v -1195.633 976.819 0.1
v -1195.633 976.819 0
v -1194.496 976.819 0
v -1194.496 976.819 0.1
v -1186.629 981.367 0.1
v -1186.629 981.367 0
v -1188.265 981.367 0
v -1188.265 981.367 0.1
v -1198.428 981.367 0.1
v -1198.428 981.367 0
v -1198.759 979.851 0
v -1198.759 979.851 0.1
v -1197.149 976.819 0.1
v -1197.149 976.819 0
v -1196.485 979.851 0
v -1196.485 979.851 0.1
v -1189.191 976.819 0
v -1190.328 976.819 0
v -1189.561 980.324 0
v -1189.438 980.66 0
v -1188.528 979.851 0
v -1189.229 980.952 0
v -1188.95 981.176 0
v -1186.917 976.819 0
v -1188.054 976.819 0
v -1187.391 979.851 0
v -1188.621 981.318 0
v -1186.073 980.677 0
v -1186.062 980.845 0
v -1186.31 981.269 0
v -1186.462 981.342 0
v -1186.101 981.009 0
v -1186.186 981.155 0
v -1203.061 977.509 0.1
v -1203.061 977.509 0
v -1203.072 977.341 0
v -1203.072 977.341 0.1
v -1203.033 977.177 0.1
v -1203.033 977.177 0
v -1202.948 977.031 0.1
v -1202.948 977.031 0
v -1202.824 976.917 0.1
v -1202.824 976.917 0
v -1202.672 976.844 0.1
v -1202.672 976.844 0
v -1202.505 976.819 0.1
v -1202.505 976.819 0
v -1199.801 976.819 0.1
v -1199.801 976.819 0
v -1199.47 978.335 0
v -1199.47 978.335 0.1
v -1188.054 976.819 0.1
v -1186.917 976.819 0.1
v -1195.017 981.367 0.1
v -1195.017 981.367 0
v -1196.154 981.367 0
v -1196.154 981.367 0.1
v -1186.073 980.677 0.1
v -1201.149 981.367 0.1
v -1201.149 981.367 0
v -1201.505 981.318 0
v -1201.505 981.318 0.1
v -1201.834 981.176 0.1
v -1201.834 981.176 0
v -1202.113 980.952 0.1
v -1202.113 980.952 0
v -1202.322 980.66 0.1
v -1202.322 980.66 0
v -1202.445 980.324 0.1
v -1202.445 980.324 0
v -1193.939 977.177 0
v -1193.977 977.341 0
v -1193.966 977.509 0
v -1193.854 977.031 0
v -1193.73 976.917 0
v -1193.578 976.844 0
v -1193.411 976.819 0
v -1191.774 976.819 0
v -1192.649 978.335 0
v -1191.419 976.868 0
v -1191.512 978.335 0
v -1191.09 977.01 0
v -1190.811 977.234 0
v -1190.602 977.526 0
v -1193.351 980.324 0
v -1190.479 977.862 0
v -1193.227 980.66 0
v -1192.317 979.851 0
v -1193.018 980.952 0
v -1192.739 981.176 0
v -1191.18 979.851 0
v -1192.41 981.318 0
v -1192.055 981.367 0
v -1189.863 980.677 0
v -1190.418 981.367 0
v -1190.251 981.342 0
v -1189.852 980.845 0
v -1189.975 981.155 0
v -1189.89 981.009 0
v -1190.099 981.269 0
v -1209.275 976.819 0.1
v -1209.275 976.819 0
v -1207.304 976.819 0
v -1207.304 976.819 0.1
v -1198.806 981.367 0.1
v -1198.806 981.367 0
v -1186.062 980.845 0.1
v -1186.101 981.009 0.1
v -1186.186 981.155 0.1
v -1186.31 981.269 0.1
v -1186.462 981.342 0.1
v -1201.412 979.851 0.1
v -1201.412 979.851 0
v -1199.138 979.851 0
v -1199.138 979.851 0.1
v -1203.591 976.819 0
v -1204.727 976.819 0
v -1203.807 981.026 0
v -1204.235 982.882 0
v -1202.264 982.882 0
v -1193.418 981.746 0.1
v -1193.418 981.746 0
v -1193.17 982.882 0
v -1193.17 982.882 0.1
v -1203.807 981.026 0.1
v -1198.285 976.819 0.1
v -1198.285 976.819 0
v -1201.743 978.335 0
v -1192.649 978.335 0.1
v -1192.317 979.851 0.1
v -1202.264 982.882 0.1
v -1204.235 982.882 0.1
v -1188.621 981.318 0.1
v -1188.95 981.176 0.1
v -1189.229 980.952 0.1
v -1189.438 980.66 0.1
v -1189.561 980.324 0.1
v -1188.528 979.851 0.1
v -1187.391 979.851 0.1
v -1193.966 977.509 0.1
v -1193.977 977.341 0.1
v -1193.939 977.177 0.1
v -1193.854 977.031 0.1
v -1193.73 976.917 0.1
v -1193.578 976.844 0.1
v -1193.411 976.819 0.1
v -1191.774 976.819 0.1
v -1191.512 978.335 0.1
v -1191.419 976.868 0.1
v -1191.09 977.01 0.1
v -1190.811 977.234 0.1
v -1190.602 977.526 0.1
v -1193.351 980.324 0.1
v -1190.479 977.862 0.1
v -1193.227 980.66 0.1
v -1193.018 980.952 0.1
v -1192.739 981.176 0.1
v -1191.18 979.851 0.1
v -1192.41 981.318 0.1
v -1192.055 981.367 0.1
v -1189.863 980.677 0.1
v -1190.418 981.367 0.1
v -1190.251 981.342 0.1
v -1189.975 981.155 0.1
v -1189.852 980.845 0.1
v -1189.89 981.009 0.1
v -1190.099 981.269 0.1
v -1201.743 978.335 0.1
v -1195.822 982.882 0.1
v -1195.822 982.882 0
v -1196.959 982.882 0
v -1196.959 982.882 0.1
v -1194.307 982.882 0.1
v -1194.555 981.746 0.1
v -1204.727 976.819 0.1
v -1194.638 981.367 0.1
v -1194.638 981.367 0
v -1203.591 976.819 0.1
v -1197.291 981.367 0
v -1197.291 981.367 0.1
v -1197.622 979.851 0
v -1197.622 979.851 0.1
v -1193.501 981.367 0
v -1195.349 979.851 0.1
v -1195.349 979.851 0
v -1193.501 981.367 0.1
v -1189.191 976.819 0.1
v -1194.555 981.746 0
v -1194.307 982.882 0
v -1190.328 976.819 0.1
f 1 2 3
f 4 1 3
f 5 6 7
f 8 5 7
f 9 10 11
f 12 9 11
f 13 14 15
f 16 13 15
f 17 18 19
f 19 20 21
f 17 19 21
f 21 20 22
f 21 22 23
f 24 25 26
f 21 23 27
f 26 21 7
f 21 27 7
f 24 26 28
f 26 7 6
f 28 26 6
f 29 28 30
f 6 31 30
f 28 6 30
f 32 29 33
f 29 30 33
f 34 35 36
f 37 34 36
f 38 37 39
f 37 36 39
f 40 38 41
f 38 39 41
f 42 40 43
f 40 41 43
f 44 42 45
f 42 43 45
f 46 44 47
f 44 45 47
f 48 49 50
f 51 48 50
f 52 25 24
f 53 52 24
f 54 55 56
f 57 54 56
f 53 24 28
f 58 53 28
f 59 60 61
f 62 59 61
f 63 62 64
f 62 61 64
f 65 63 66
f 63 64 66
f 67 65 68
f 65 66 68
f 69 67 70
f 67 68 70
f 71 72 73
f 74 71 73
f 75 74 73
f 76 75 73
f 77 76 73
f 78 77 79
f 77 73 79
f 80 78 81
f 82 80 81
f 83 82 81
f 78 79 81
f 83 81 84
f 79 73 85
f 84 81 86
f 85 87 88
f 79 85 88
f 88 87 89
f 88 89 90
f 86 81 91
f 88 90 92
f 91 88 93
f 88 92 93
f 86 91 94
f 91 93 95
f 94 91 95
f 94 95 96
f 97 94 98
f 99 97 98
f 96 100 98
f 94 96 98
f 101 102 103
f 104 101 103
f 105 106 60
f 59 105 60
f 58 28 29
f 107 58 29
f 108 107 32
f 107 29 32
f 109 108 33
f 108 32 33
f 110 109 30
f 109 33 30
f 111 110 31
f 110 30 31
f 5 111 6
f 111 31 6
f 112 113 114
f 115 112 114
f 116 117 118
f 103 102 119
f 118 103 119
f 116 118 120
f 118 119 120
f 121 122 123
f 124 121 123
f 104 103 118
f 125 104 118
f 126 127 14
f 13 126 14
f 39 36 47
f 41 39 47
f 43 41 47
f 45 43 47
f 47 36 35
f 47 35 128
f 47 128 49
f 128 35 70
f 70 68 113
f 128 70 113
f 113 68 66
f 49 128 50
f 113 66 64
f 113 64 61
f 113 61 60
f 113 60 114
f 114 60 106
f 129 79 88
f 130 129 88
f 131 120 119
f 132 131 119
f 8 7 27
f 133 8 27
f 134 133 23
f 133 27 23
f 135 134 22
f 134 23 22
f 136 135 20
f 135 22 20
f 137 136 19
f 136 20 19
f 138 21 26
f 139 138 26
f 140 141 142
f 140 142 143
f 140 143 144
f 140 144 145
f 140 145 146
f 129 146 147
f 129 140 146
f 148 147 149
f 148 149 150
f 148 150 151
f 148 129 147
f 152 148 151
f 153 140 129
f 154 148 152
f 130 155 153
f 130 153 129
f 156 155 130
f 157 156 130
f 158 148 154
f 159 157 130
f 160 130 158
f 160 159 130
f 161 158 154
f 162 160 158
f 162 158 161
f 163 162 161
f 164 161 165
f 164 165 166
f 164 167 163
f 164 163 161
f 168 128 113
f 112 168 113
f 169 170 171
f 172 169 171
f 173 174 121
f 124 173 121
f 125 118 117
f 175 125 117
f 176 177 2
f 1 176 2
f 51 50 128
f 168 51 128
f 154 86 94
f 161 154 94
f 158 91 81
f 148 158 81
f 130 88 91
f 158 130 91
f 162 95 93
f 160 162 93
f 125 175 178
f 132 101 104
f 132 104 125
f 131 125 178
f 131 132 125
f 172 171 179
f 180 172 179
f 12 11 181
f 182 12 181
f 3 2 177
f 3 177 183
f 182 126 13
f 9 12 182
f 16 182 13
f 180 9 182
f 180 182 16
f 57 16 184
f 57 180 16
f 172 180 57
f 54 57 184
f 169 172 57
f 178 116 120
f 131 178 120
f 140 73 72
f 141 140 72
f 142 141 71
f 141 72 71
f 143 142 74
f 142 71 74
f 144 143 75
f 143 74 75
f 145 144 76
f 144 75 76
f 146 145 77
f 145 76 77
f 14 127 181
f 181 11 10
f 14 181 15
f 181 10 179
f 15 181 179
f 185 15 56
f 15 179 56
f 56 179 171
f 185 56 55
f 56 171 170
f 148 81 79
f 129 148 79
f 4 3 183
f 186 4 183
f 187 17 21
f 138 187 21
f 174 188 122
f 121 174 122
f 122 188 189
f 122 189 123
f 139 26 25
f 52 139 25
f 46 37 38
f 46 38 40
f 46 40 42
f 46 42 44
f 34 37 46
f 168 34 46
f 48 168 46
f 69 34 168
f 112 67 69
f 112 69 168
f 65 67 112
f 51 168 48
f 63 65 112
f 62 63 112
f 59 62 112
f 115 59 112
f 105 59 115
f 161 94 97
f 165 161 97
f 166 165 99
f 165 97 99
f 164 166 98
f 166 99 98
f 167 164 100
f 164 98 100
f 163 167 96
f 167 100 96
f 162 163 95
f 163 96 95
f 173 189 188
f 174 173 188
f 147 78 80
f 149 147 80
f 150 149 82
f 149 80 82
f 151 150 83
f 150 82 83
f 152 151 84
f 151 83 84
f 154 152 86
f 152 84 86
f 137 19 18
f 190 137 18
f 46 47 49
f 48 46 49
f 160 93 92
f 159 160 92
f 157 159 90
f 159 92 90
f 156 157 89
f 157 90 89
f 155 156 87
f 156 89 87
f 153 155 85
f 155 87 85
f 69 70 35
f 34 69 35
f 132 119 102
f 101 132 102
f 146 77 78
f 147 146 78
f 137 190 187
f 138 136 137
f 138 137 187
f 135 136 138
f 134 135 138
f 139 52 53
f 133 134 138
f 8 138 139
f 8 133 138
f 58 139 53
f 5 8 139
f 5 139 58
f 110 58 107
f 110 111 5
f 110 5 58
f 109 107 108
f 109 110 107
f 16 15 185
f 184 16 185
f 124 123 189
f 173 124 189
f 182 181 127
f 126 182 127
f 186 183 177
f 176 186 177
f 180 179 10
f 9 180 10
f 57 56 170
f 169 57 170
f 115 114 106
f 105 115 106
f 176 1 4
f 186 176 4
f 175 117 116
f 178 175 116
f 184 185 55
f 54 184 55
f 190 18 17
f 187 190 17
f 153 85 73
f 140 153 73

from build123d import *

# Parameters (mm, degrees)
EXTRUDE_1_DEPTH   = 0.1
EXTRUDE_1_2_DEPTH = 0.1
EXTRUDE_1_3_DEPTH = 0.1
EXTRUDE_1_4_DEPTH = 0.1
EXTRUDE_1_5_DEPTH = 0.1
EXTRUDE_1_6_DEPTH = 0.1
EXTRUDE_1_7_DEPTH = 0.1


with BuildPart() as part:
    # Model → 凸台-拉伸1 (new body)
    with BuildSketch(Plane.XY):
        with BuildLine():
            Line((-1190.478526859, 977.862250119), (-1189.862850473, 980.676770742))
            ThreePointArc((-1189.862850473, 980.676770742), (-1189.975335469, 981.15463877), (-1190.418127061, 981.366644271))
            Line((-1190.418127061, 981.366644271), (-1192.054861552, 981.366644271))
            ThreePointArc((-1192.054861552, 981.366644271), (-1192.886464525, 981.073542177), (-1193.350506926, 980.323784221))
            Line((-1193.350506926, 980.323784221), (-1193.966183312, 977.509263598))
            ThreePointArc((-1193.966183312, 977.509263598), (-1193.853698316, 977.03139557), (-1193.410906724, 976.819390069))
            Line((-1193.410906724, 976.819390069), (-1191.774172233, 976.819390069))
            ThreePointArc((-1191.774172233, 976.819390069), (-1190.94256926, 977.112492163), (-1190.478526859, 977.862250119))
        make_face()
        Polygon((-1192.648708977, 978.335141469), (-1192.317138358, 979.85089287), (-1191.180324808, 979.85089287), (-1191.511895427, 978.335141469), align=None, mode=Mode.SUBTRACT)
    extrude(amount=EXTRUDE_1_DEPTH)


with BuildPart() as body_2:
    # Model → Extrude 1 2 (new body)
    with BuildSketch(Plane.XY):
        with BuildLine():
            Line((-1201.743217383, 978.335141469), (-1201.411646764, 979.85089287))
            Line((-1201.411646764, 979.85089287), (-1199.138019662, 979.85089287))
            Line((-1199.138019662, 979.85089287), (-1198.806449043, 981.366644271))
            Line((-1198.806449043, 981.366644271), (-1201.149369958, 981.366644271))
            ThreePointArc((-1201.149369958, 981.366644271), (-1201.980972931, 981.073542177), (-1202.445015332, 980.323784221))
            Line((-1202.445015332, 980.323784221), (-1203.060691718, 977.509263598))
            ThreePointArc((-1203.060691718, 977.509263598), (-1202.948206721, 977.03139557), (-1202.505415129, 976.819390069))
            Line((-1202.505415129, 976.819390069), (-1199.8011609, 976.819390069))
            Line((-1199.8011609, 976.819390069), (-1199.469590281, 978.335141469))
            Line((-1199.469590281, 978.335141469), (-1201.743217383, 978.335141469))
        make_face()
    extrude(amount=EXTRUDE_1_2_DEPTH)


with BuildPart() as body_3:
    # Model → Extrude 1 3 (new body)
    with BuildSketch(Plane.XY):
        Polygon((-1197.290697643, 981.366644271), (-1198.427511193, 981.366644271), (-1198.759081812, 979.85089287), (-1197.622268262, 979.85089287), (-1198.285409499, 976.819390069), (-1197.148595949, 976.819390069), (-1196.485454711, 979.85089287), (-1195.34864116, 979.85089287), (-1195.017070541, 981.366644271), (-1196.153884092, 981.366644271), (-1195.822313473, 982.882395672), (-1196.959127024, 982.882395672), align=None)
    extrude(amount=EXTRUDE_1_3_DEPTH)


with BuildPart() as body_4:
    # Model → Extrude 1 4 (new body)
    with BuildSketch(Plane.XY):
        Polygon((-1193.50131914, 981.366644271), (-1194.638132691, 981.366644271), (-1195.632844548, 976.819390069), (-1194.496030997, 976.819390069), align=None)
    extrude(amount=EXTRUDE_1_4_DEPTH)


with BuildPart() as body_5:
    # Model → Extrude 1 5 (new body)
    with BuildSketch(Plane.XY):
        with BuildLine():
            Line((-1186.628748559, 981.366644271), (-1188.26548305, 981.366644271))
            ThreePointArc((-1188.26548305, 981.366644271), (-1189.097086023, 981.073542177), (-1189.561128424, 980.323784221))
            Line((-1189.561128424, 980.323784221), (-1190.327714645, 976.819390069))
            Line((-1190.327714645, 976.819390069), (-1189.190901094, 976.819390069))
            Line((-1189.190901094, 976.819390069), (-1188.527759856, 979.85089287))
            Line((-1188.527759856, 979.85089287), (-1187.390946306, 979.85089287))
            Line((-1187.390946306, 979.85089287), (-1188.054087543, 976.819390069))
            Line((-1188.054087543, 976.819390069), (-1186.917273993, 976.819390069))
            Line((-1186.917273993, 976.819390069), (-1186.07347197, 980.676770742))
            ThreePointArc((-1186.07347197, 980.676770742), (-1186.185956967, 981.15463877), (-1186.628748559, 981.366644271))
        make_face()
    extrude(amount=EXTRUDE_1_5_DEPTH)


with BuildPart() as body_6:
    # Model → Extrude 1 6 (new body)
    with BuildSketch(Plane.XY):
        Polygon((-1203.590539403, 976.819390069), (-1202.264256927, 982.882395672), (-1204.235224551, 982.882395672), (-1209.274607156, 976.819390069), (-1207.303639532, 976.819390069), (-1203.807128983, 981.026128217), (-1204.727352953, 976.819390069), align=None)
    extrude(amount=EXTRUDE_1_6_DEPTH)


with BuildPart() as body_7:
    # Model → Extrude 1 7 (new body)
    with BuildSketch(Plane.XY):
        Polygon((-1194.306562072, 982.882395672), (-1194.555240036, 981.745582121), (-1193.418426486, 981.745582121), (-1193.169748521, 982.882395672), align=None)
    extrude(amount=EXTRUDE_1_7_DEPTH)


solid = Compound([part.part, body_2.part, body_3.part, body_4.part, body_5.part, body_6.part, body_7.part])
